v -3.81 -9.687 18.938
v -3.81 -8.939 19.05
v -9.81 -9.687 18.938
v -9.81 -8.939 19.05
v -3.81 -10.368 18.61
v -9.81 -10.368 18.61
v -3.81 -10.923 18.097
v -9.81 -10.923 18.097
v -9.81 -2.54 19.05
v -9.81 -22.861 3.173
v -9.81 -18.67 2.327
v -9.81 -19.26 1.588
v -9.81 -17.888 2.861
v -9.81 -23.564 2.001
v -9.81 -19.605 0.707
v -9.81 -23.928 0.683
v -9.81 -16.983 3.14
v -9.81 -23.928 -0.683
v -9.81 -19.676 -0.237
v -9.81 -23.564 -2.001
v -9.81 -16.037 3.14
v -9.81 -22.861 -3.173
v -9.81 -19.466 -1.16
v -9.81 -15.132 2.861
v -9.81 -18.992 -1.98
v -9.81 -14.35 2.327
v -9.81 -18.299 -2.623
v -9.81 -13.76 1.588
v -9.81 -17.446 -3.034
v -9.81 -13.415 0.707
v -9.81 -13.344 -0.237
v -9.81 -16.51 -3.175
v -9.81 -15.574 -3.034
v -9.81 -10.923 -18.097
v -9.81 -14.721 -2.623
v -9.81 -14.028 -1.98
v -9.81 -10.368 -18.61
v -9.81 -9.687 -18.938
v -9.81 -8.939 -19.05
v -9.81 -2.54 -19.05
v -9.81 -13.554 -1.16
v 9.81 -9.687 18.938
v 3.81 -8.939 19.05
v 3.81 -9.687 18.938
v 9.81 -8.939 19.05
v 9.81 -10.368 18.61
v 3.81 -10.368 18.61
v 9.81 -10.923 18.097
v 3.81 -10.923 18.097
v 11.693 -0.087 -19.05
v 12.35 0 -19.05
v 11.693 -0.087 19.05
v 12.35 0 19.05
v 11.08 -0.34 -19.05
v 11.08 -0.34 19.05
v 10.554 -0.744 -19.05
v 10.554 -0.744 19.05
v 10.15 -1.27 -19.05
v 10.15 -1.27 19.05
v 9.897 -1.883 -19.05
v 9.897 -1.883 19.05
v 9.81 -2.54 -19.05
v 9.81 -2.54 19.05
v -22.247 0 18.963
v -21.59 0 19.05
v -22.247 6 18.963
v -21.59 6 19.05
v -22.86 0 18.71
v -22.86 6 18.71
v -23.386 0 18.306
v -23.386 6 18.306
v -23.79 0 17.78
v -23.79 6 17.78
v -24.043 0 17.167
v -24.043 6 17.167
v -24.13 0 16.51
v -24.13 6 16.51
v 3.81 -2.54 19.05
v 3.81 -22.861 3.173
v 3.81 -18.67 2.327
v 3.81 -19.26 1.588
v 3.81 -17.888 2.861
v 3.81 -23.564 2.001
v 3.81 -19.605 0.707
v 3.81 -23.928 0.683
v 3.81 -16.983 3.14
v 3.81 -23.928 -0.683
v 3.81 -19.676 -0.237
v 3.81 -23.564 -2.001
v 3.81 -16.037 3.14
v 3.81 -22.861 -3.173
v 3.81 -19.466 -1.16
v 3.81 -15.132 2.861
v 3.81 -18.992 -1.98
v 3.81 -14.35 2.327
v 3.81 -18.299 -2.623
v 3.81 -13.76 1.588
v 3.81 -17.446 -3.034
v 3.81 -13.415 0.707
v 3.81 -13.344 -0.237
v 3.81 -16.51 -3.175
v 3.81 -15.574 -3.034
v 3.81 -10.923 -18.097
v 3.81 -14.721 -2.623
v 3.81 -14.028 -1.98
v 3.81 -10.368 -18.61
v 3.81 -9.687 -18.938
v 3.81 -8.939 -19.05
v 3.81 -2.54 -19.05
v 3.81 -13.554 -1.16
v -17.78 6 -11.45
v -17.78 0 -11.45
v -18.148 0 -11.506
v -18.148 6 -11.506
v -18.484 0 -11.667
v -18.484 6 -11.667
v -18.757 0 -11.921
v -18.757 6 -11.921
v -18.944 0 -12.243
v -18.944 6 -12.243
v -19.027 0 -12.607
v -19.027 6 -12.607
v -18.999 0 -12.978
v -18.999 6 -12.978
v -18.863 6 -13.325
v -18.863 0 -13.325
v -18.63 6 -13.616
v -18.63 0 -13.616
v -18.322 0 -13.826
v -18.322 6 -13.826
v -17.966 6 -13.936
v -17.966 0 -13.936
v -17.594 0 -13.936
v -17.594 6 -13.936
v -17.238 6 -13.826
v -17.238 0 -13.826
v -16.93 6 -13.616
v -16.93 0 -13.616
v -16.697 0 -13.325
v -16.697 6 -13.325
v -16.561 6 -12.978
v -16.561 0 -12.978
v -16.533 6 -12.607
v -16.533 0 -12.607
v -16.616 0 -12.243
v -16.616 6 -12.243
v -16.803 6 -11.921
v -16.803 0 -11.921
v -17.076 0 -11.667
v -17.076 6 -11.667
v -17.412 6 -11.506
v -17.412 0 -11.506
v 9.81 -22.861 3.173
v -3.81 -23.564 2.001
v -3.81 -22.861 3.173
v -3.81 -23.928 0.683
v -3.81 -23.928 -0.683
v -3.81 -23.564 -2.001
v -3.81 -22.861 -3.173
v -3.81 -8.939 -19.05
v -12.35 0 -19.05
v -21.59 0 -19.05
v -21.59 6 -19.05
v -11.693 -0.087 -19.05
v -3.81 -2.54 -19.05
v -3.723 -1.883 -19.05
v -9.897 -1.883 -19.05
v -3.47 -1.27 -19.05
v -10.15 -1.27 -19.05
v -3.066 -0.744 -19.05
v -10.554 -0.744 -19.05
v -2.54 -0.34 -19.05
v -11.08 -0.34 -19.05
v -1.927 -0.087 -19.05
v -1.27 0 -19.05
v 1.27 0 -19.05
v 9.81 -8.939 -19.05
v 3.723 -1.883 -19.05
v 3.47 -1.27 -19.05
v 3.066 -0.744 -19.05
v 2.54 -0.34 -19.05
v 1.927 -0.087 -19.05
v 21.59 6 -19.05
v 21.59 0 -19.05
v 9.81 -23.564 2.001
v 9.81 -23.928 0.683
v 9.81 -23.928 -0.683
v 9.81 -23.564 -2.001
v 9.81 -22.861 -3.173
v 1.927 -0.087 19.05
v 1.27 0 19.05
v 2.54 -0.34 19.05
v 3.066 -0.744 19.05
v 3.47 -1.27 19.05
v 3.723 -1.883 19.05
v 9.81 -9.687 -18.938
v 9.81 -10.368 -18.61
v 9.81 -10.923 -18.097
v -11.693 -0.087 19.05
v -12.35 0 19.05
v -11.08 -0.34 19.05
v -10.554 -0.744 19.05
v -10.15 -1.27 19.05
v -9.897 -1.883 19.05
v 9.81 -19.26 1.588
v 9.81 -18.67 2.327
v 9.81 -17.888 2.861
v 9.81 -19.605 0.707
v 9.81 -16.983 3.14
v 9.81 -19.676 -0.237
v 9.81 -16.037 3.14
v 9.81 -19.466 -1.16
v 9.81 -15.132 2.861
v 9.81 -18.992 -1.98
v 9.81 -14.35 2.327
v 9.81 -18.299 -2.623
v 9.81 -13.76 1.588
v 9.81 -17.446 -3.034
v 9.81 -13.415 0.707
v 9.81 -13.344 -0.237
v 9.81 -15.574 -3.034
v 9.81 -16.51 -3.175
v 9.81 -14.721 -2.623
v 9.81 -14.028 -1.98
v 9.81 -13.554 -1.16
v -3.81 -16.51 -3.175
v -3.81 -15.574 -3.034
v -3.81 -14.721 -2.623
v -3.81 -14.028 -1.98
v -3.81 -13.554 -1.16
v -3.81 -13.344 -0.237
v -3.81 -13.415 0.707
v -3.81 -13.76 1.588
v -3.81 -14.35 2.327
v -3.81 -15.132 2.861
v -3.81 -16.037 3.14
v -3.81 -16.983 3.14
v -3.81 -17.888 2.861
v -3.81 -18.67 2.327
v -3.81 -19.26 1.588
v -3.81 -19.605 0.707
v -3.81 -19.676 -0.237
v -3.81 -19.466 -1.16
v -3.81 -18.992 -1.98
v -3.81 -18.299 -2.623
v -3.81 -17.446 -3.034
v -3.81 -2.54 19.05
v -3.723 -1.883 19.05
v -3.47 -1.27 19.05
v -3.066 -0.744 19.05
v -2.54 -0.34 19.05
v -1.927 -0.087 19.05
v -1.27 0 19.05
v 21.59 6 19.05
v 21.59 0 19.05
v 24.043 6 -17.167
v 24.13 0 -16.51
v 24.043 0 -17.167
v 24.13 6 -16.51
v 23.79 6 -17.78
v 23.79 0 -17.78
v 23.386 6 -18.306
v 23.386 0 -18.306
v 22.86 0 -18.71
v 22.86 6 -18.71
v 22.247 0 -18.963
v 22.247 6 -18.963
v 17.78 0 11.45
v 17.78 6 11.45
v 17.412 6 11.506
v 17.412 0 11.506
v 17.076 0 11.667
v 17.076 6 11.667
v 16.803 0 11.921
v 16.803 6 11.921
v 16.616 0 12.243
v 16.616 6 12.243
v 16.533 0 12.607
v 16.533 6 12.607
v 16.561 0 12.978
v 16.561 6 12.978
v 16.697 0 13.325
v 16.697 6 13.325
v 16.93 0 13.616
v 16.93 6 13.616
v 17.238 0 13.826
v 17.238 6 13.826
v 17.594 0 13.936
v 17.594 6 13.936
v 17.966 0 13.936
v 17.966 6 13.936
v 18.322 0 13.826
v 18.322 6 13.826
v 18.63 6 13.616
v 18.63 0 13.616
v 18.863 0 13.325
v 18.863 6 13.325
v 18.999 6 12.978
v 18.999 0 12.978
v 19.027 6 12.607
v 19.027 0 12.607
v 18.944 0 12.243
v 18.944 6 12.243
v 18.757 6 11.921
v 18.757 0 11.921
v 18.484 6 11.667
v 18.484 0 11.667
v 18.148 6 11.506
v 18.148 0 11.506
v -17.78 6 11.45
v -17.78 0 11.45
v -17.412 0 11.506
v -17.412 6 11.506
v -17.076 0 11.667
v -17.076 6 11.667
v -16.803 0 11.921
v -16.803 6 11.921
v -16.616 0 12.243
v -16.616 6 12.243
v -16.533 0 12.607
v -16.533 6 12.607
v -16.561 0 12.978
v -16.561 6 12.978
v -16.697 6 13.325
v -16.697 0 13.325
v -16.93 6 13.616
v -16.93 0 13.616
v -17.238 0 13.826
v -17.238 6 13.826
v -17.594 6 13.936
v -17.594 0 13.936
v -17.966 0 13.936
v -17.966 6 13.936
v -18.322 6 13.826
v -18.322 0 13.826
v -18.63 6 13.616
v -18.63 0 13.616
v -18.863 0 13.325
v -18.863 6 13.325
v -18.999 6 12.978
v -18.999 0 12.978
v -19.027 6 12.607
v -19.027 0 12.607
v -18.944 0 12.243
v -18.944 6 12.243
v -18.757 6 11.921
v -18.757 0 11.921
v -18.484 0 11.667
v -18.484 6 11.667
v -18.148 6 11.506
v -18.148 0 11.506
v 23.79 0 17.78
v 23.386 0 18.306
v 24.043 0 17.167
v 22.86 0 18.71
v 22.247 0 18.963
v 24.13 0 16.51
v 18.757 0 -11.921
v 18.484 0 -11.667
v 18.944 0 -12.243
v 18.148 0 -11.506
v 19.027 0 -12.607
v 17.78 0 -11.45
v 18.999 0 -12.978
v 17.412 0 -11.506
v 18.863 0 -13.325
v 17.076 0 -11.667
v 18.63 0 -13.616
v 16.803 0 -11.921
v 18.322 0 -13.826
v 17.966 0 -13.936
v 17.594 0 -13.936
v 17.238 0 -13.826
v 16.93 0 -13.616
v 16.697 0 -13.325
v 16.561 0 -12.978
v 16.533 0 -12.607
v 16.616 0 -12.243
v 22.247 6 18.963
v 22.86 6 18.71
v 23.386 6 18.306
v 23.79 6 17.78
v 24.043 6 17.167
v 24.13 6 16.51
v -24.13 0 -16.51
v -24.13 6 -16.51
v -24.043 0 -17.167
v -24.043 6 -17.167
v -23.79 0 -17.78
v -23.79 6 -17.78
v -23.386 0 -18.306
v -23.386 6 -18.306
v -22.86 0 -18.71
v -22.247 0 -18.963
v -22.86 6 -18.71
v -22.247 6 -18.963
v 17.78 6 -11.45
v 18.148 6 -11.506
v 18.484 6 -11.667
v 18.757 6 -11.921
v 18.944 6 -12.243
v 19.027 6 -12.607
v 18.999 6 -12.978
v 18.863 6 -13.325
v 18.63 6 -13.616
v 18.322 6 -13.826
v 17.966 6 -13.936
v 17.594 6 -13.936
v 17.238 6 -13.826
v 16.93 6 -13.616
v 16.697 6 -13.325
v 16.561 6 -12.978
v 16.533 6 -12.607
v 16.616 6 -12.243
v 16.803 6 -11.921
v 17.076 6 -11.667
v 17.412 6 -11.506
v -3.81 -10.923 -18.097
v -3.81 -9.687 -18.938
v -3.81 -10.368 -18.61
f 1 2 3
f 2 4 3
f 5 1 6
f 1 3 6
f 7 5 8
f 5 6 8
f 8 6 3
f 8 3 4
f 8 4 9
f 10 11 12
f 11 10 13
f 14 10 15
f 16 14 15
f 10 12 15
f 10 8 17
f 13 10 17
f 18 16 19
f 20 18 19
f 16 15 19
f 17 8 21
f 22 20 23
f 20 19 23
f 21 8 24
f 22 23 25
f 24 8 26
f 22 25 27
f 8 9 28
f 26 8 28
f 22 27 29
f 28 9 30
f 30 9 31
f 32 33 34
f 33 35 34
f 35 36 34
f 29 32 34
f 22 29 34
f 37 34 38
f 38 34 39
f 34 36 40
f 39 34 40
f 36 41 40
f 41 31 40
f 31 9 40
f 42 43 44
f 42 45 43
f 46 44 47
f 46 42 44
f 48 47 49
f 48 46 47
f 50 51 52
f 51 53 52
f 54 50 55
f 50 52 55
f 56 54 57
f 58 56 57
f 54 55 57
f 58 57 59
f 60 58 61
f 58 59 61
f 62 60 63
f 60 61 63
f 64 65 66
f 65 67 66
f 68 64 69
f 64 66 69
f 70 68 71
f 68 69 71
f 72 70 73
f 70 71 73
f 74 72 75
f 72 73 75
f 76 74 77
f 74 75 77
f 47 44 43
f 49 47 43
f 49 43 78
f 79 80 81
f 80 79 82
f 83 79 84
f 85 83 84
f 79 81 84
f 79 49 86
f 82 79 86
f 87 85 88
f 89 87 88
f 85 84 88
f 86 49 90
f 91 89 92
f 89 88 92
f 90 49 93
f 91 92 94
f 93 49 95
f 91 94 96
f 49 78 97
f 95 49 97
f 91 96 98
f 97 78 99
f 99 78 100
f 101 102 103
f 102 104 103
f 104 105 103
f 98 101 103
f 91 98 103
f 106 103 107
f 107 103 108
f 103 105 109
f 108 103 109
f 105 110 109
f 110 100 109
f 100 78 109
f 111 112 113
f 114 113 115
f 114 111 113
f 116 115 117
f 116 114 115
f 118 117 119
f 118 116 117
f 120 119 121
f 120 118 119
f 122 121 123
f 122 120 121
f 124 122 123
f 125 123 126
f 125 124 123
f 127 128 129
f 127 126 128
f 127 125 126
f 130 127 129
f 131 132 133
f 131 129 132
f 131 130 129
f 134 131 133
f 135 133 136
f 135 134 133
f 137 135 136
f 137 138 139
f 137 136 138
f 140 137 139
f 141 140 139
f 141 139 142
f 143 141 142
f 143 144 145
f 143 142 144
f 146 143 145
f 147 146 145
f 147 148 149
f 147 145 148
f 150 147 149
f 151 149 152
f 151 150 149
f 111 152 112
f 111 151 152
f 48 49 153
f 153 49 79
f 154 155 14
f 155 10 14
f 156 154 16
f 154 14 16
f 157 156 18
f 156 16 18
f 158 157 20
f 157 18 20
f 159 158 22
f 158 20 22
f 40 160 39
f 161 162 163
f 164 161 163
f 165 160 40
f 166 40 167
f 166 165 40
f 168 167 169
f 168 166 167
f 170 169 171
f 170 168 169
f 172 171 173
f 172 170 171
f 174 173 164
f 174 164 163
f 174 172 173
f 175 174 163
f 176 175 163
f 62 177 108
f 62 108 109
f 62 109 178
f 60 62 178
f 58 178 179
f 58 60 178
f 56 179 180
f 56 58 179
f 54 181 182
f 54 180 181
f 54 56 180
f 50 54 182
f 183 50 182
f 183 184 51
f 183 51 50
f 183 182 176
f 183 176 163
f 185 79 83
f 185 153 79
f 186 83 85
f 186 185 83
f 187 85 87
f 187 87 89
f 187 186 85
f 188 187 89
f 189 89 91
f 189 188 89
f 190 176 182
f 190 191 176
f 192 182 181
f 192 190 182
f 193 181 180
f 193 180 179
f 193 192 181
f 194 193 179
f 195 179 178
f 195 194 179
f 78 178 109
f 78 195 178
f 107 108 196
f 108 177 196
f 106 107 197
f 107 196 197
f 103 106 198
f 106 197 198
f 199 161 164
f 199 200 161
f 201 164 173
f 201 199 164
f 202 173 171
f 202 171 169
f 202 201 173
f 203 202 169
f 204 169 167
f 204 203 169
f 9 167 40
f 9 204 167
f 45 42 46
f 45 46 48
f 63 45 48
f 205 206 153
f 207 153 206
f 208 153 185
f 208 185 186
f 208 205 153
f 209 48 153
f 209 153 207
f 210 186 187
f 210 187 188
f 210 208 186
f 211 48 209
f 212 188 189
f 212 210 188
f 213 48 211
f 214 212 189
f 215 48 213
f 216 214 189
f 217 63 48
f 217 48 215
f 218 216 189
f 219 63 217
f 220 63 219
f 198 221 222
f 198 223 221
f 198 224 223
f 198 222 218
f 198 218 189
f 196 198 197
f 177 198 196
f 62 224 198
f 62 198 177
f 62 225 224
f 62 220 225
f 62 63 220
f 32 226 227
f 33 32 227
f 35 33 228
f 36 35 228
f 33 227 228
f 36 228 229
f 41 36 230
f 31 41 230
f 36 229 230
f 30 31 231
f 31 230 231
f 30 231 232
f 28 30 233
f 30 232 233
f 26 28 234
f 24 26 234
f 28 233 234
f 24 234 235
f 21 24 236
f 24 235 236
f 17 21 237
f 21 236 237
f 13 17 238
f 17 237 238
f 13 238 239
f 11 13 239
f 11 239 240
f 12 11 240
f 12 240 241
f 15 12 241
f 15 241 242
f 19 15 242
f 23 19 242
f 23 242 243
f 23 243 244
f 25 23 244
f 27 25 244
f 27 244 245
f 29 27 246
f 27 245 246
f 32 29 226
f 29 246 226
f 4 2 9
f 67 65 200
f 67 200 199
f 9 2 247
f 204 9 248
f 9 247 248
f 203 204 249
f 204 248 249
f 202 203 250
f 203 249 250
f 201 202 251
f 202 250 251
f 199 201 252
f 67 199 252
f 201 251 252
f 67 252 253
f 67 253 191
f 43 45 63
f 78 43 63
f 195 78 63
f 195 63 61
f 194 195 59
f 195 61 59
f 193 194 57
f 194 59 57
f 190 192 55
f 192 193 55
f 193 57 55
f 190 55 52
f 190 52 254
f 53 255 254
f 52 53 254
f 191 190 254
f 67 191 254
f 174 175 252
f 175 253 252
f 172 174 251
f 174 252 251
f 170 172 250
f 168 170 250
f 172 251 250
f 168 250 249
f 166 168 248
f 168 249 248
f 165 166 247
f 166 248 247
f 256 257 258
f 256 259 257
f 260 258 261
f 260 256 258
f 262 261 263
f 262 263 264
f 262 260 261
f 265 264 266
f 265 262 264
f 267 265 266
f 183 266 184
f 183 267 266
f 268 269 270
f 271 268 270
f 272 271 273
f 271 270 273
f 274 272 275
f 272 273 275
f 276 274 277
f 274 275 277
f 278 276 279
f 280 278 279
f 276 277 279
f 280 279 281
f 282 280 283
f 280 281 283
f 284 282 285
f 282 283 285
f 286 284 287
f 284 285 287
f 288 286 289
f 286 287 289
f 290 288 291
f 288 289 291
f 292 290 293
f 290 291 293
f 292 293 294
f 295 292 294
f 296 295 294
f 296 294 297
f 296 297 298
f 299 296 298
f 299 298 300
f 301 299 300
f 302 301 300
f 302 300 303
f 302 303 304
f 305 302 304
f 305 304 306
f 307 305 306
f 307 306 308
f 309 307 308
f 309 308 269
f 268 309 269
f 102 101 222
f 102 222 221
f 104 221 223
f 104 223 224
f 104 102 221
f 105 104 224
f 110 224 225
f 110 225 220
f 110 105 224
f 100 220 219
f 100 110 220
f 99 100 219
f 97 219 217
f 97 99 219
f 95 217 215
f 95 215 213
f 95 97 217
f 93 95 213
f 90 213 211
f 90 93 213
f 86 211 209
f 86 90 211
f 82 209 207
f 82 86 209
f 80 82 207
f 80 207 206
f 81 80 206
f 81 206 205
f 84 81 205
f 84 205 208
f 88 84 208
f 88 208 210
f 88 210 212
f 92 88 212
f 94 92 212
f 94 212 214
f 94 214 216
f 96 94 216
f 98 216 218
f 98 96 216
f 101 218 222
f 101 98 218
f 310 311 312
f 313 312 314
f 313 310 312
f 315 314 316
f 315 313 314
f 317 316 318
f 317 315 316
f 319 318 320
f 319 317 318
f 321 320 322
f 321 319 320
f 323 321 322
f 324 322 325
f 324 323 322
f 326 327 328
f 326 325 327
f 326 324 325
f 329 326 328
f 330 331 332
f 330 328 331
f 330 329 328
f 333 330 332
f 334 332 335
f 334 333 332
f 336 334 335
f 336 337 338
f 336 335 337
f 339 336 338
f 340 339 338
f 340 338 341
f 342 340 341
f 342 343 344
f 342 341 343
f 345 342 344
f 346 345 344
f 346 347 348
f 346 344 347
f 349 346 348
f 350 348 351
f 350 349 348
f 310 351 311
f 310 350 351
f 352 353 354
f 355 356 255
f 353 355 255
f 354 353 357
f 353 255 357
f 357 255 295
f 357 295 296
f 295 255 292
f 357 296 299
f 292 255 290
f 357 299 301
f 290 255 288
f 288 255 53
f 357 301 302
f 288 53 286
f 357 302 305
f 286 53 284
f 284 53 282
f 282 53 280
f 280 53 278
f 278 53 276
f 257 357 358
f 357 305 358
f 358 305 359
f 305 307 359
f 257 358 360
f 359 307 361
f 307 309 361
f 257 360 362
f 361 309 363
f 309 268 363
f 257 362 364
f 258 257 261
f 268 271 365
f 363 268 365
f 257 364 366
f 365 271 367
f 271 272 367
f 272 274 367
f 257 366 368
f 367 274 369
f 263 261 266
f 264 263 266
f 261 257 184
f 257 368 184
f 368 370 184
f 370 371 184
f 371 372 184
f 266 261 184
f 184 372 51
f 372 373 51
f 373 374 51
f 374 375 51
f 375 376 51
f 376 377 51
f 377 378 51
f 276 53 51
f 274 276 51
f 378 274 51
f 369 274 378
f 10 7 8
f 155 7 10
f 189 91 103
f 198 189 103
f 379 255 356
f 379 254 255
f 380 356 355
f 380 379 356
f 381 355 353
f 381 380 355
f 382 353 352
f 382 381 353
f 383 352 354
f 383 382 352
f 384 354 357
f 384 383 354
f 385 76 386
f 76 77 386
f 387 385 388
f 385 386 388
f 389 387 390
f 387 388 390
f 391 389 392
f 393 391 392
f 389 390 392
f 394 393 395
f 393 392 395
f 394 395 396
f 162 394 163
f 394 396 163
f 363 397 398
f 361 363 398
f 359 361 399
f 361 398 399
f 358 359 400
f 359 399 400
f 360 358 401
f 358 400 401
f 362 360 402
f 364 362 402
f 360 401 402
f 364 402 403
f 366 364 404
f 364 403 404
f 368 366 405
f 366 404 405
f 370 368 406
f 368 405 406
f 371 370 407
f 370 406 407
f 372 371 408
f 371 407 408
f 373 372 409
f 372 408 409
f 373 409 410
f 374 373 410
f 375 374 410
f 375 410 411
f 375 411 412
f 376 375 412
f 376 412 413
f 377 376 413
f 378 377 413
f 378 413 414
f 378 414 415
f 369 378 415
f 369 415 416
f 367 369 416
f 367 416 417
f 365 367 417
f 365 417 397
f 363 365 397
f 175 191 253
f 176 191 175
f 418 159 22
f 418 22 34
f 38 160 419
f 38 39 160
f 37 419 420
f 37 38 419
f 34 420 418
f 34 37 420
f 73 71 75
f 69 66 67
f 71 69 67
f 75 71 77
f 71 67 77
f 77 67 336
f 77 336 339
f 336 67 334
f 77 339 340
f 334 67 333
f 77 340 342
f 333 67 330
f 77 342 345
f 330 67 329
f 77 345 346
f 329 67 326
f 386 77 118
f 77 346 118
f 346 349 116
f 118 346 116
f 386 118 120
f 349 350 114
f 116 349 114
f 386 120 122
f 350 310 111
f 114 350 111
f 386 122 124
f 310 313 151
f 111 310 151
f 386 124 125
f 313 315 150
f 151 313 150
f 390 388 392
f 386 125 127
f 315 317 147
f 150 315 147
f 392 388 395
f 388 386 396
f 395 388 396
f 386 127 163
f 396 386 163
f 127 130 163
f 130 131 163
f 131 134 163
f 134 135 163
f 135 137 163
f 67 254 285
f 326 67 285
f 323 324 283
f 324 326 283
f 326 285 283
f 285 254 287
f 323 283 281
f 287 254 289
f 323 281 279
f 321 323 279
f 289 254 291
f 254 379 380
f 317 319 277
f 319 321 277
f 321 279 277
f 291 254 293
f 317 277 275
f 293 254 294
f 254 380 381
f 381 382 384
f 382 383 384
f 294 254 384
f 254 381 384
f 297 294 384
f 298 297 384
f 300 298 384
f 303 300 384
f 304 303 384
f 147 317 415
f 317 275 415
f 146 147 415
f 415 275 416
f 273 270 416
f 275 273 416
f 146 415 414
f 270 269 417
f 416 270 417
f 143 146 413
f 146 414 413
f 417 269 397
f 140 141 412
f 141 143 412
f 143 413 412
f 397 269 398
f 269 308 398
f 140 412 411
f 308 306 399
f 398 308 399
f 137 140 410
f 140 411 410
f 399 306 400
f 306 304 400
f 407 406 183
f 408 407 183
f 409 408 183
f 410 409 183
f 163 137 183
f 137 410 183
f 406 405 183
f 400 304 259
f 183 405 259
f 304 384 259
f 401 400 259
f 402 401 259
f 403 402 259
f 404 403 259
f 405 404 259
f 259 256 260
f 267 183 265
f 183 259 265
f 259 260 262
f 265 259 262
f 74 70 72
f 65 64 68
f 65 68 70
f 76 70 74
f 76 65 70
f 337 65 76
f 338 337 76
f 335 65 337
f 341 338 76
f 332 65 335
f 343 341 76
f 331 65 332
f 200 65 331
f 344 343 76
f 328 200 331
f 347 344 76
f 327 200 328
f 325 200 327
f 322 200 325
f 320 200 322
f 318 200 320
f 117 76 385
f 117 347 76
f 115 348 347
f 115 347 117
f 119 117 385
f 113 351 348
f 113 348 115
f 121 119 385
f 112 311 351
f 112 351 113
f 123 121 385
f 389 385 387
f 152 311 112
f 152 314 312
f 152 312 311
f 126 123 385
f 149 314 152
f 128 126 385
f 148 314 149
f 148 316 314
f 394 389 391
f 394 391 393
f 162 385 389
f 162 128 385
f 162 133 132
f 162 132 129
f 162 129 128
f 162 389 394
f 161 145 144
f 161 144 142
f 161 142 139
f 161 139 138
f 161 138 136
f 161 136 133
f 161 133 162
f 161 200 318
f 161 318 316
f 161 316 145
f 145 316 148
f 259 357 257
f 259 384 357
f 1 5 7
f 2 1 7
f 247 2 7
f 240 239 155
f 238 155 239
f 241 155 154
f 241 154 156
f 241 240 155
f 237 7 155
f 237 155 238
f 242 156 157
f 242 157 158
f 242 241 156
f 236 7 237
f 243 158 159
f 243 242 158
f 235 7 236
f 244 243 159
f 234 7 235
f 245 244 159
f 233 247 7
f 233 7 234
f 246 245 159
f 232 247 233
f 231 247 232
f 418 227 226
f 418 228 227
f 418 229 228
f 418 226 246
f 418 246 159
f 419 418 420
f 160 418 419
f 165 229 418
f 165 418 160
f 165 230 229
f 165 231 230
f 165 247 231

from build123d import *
from OCP.BRepFilletAPI import BRepFilletAPI_MakeFillet

# Parameters (mm, degrees)
SKETCH1_R           = 3.175
BOSS_EXTRUDE1_DEPTH = 6
BOSS_EXTRUDE2_START = -3.81
SKETCH1_3_W         = 38.1
SKETCH1_3_H         = 5.999999938
BOSS_EXTRUDE2_DEPTH = 24.13
SKETCH3_R           = 1.25
CUT_EXTRUDE1_DEPTH  = 44.944503594
FILLET1_R1          = 2.54
FILLET1_R2          = 5.08


with BuildPart() as part:
    # Sketch1 → Boss-Extrude1 (new body)
    with BuildSketch(Plane(origin=(3.81, 0, 0), x_dir=(0, 0, -1), z_dir=(1, 0, 0))):
        Polygon((-19.05, 0), (-19.05, -10.16), (0, -25.4), (19.05, -10.16), (19.05, 0), align=None)
        with Locations((0, -16.51)):
            Circle(SKETCH1_R, mode=Mode.SUBTRACT)
    boss_extrude1 = extrude(amount=BOSS_EXTRUDE1_DEPTH)

    # Sketch1<3> → Boss-Extrude2 (add)
    with BuildSketch(Plane(origin=(3.81, 0, 0), x_dir=(0, 0, -1), z_dir=(1, 0, 0)).offset(BOSS_EXTRUDE2_START)):
        with Locations((0, 2.999999969)):
            Rectangle(SKETCH1_3_W, SKETCH1_3_H)
    boss_extrude2 = extrude(amount=BOSS_EXTRUDE2_DEPTH)

    # Sketch3 → Cut-Extrude1 (cut, through all)
    with BuildSketch(Plane(origin=(0, 5.999999938, 0), x_dir=(1, 0, 0), z_dir=(0, 1, 0))):
        with Locations(Location((17.78, 12.7, 0), (0, 0, 270))):
            Circle(SKETCH3_R)
        with Locations(Location((17.78, -12.7, 0), (0, 0, 90))):
            Circle(SKETCH3_R)
    cut_extrude1 = extrude(amount=-CUT_EXTRUDE1_DEPTH, mode=Mode.SUBTRACT)

    # Mirror2: Boss-Extrude2, Cut-Extrude1 across plane
    add(boss_extrude2.mirror(Plane(origin=(0, 0, 0), x_dir=(0, 0, 1), z_dir=(1, 0, 0))))
    add(cut_extrude1.mirror(Plane(origin=(0, 0, 0), x_dir=(0, 0, 1), z_dir=(1, 0, 0))), mode=Mode.SUBTRACT)

    # Mirror3: Boss-Extrude1 across plane
    add(boss_extrude1.mirror(Plane(origin=(0, 0, 0), x_dir=(0, 0, 1), z_dir=(1, 0, 0))))

    # Fillet1: one fillet with a radius per group of edges: ONE call of the kernel's fillet builder (fillet() takes one radius for all edges)
    fillet1_edges_1 = [part.edges().sort_by_distance(p)[0] for p in [
        (6.81, -10.16, 19.05),
        (6.81, -10.16, -19.05),
        (9.81, 0, 0),
        (24.13, 2.999999969, 19.05),
        (24.13, 2.999999969, -19.05),
        (-24.13, 2.999999969, -19.05),
        (-24.13, 2.999999969, 19.05),
        (-6.81, -10.16, -19.05),
        (-6.81, -10.16, 19.05),
        (-3.81, 0, 0),
        (-9.81, 0, 0),
        (3.81, 0, 0),
    ]]
    fillet1_edges_2 = [part.edges().sort_by_distance(p)[0] for p in [
        (6.81, -25.4, 0),
        (-6.81, -25.4, 0),
    ]]
    fillet1 = BRepFilletAPI_MakeFillet(part.part.solid().wrapped)
    for e in fillet1_edges_1:
        fillet1.Add(FILLET1_R1, e.wrapped)
    for e in fillet1_edges_2:
        fillet1.Add(FILLET1_R2, e.wrapped)
    add(Compound.cast(fillet1.Shape()), mode=Mode.REPLACE)


solid = part.part
